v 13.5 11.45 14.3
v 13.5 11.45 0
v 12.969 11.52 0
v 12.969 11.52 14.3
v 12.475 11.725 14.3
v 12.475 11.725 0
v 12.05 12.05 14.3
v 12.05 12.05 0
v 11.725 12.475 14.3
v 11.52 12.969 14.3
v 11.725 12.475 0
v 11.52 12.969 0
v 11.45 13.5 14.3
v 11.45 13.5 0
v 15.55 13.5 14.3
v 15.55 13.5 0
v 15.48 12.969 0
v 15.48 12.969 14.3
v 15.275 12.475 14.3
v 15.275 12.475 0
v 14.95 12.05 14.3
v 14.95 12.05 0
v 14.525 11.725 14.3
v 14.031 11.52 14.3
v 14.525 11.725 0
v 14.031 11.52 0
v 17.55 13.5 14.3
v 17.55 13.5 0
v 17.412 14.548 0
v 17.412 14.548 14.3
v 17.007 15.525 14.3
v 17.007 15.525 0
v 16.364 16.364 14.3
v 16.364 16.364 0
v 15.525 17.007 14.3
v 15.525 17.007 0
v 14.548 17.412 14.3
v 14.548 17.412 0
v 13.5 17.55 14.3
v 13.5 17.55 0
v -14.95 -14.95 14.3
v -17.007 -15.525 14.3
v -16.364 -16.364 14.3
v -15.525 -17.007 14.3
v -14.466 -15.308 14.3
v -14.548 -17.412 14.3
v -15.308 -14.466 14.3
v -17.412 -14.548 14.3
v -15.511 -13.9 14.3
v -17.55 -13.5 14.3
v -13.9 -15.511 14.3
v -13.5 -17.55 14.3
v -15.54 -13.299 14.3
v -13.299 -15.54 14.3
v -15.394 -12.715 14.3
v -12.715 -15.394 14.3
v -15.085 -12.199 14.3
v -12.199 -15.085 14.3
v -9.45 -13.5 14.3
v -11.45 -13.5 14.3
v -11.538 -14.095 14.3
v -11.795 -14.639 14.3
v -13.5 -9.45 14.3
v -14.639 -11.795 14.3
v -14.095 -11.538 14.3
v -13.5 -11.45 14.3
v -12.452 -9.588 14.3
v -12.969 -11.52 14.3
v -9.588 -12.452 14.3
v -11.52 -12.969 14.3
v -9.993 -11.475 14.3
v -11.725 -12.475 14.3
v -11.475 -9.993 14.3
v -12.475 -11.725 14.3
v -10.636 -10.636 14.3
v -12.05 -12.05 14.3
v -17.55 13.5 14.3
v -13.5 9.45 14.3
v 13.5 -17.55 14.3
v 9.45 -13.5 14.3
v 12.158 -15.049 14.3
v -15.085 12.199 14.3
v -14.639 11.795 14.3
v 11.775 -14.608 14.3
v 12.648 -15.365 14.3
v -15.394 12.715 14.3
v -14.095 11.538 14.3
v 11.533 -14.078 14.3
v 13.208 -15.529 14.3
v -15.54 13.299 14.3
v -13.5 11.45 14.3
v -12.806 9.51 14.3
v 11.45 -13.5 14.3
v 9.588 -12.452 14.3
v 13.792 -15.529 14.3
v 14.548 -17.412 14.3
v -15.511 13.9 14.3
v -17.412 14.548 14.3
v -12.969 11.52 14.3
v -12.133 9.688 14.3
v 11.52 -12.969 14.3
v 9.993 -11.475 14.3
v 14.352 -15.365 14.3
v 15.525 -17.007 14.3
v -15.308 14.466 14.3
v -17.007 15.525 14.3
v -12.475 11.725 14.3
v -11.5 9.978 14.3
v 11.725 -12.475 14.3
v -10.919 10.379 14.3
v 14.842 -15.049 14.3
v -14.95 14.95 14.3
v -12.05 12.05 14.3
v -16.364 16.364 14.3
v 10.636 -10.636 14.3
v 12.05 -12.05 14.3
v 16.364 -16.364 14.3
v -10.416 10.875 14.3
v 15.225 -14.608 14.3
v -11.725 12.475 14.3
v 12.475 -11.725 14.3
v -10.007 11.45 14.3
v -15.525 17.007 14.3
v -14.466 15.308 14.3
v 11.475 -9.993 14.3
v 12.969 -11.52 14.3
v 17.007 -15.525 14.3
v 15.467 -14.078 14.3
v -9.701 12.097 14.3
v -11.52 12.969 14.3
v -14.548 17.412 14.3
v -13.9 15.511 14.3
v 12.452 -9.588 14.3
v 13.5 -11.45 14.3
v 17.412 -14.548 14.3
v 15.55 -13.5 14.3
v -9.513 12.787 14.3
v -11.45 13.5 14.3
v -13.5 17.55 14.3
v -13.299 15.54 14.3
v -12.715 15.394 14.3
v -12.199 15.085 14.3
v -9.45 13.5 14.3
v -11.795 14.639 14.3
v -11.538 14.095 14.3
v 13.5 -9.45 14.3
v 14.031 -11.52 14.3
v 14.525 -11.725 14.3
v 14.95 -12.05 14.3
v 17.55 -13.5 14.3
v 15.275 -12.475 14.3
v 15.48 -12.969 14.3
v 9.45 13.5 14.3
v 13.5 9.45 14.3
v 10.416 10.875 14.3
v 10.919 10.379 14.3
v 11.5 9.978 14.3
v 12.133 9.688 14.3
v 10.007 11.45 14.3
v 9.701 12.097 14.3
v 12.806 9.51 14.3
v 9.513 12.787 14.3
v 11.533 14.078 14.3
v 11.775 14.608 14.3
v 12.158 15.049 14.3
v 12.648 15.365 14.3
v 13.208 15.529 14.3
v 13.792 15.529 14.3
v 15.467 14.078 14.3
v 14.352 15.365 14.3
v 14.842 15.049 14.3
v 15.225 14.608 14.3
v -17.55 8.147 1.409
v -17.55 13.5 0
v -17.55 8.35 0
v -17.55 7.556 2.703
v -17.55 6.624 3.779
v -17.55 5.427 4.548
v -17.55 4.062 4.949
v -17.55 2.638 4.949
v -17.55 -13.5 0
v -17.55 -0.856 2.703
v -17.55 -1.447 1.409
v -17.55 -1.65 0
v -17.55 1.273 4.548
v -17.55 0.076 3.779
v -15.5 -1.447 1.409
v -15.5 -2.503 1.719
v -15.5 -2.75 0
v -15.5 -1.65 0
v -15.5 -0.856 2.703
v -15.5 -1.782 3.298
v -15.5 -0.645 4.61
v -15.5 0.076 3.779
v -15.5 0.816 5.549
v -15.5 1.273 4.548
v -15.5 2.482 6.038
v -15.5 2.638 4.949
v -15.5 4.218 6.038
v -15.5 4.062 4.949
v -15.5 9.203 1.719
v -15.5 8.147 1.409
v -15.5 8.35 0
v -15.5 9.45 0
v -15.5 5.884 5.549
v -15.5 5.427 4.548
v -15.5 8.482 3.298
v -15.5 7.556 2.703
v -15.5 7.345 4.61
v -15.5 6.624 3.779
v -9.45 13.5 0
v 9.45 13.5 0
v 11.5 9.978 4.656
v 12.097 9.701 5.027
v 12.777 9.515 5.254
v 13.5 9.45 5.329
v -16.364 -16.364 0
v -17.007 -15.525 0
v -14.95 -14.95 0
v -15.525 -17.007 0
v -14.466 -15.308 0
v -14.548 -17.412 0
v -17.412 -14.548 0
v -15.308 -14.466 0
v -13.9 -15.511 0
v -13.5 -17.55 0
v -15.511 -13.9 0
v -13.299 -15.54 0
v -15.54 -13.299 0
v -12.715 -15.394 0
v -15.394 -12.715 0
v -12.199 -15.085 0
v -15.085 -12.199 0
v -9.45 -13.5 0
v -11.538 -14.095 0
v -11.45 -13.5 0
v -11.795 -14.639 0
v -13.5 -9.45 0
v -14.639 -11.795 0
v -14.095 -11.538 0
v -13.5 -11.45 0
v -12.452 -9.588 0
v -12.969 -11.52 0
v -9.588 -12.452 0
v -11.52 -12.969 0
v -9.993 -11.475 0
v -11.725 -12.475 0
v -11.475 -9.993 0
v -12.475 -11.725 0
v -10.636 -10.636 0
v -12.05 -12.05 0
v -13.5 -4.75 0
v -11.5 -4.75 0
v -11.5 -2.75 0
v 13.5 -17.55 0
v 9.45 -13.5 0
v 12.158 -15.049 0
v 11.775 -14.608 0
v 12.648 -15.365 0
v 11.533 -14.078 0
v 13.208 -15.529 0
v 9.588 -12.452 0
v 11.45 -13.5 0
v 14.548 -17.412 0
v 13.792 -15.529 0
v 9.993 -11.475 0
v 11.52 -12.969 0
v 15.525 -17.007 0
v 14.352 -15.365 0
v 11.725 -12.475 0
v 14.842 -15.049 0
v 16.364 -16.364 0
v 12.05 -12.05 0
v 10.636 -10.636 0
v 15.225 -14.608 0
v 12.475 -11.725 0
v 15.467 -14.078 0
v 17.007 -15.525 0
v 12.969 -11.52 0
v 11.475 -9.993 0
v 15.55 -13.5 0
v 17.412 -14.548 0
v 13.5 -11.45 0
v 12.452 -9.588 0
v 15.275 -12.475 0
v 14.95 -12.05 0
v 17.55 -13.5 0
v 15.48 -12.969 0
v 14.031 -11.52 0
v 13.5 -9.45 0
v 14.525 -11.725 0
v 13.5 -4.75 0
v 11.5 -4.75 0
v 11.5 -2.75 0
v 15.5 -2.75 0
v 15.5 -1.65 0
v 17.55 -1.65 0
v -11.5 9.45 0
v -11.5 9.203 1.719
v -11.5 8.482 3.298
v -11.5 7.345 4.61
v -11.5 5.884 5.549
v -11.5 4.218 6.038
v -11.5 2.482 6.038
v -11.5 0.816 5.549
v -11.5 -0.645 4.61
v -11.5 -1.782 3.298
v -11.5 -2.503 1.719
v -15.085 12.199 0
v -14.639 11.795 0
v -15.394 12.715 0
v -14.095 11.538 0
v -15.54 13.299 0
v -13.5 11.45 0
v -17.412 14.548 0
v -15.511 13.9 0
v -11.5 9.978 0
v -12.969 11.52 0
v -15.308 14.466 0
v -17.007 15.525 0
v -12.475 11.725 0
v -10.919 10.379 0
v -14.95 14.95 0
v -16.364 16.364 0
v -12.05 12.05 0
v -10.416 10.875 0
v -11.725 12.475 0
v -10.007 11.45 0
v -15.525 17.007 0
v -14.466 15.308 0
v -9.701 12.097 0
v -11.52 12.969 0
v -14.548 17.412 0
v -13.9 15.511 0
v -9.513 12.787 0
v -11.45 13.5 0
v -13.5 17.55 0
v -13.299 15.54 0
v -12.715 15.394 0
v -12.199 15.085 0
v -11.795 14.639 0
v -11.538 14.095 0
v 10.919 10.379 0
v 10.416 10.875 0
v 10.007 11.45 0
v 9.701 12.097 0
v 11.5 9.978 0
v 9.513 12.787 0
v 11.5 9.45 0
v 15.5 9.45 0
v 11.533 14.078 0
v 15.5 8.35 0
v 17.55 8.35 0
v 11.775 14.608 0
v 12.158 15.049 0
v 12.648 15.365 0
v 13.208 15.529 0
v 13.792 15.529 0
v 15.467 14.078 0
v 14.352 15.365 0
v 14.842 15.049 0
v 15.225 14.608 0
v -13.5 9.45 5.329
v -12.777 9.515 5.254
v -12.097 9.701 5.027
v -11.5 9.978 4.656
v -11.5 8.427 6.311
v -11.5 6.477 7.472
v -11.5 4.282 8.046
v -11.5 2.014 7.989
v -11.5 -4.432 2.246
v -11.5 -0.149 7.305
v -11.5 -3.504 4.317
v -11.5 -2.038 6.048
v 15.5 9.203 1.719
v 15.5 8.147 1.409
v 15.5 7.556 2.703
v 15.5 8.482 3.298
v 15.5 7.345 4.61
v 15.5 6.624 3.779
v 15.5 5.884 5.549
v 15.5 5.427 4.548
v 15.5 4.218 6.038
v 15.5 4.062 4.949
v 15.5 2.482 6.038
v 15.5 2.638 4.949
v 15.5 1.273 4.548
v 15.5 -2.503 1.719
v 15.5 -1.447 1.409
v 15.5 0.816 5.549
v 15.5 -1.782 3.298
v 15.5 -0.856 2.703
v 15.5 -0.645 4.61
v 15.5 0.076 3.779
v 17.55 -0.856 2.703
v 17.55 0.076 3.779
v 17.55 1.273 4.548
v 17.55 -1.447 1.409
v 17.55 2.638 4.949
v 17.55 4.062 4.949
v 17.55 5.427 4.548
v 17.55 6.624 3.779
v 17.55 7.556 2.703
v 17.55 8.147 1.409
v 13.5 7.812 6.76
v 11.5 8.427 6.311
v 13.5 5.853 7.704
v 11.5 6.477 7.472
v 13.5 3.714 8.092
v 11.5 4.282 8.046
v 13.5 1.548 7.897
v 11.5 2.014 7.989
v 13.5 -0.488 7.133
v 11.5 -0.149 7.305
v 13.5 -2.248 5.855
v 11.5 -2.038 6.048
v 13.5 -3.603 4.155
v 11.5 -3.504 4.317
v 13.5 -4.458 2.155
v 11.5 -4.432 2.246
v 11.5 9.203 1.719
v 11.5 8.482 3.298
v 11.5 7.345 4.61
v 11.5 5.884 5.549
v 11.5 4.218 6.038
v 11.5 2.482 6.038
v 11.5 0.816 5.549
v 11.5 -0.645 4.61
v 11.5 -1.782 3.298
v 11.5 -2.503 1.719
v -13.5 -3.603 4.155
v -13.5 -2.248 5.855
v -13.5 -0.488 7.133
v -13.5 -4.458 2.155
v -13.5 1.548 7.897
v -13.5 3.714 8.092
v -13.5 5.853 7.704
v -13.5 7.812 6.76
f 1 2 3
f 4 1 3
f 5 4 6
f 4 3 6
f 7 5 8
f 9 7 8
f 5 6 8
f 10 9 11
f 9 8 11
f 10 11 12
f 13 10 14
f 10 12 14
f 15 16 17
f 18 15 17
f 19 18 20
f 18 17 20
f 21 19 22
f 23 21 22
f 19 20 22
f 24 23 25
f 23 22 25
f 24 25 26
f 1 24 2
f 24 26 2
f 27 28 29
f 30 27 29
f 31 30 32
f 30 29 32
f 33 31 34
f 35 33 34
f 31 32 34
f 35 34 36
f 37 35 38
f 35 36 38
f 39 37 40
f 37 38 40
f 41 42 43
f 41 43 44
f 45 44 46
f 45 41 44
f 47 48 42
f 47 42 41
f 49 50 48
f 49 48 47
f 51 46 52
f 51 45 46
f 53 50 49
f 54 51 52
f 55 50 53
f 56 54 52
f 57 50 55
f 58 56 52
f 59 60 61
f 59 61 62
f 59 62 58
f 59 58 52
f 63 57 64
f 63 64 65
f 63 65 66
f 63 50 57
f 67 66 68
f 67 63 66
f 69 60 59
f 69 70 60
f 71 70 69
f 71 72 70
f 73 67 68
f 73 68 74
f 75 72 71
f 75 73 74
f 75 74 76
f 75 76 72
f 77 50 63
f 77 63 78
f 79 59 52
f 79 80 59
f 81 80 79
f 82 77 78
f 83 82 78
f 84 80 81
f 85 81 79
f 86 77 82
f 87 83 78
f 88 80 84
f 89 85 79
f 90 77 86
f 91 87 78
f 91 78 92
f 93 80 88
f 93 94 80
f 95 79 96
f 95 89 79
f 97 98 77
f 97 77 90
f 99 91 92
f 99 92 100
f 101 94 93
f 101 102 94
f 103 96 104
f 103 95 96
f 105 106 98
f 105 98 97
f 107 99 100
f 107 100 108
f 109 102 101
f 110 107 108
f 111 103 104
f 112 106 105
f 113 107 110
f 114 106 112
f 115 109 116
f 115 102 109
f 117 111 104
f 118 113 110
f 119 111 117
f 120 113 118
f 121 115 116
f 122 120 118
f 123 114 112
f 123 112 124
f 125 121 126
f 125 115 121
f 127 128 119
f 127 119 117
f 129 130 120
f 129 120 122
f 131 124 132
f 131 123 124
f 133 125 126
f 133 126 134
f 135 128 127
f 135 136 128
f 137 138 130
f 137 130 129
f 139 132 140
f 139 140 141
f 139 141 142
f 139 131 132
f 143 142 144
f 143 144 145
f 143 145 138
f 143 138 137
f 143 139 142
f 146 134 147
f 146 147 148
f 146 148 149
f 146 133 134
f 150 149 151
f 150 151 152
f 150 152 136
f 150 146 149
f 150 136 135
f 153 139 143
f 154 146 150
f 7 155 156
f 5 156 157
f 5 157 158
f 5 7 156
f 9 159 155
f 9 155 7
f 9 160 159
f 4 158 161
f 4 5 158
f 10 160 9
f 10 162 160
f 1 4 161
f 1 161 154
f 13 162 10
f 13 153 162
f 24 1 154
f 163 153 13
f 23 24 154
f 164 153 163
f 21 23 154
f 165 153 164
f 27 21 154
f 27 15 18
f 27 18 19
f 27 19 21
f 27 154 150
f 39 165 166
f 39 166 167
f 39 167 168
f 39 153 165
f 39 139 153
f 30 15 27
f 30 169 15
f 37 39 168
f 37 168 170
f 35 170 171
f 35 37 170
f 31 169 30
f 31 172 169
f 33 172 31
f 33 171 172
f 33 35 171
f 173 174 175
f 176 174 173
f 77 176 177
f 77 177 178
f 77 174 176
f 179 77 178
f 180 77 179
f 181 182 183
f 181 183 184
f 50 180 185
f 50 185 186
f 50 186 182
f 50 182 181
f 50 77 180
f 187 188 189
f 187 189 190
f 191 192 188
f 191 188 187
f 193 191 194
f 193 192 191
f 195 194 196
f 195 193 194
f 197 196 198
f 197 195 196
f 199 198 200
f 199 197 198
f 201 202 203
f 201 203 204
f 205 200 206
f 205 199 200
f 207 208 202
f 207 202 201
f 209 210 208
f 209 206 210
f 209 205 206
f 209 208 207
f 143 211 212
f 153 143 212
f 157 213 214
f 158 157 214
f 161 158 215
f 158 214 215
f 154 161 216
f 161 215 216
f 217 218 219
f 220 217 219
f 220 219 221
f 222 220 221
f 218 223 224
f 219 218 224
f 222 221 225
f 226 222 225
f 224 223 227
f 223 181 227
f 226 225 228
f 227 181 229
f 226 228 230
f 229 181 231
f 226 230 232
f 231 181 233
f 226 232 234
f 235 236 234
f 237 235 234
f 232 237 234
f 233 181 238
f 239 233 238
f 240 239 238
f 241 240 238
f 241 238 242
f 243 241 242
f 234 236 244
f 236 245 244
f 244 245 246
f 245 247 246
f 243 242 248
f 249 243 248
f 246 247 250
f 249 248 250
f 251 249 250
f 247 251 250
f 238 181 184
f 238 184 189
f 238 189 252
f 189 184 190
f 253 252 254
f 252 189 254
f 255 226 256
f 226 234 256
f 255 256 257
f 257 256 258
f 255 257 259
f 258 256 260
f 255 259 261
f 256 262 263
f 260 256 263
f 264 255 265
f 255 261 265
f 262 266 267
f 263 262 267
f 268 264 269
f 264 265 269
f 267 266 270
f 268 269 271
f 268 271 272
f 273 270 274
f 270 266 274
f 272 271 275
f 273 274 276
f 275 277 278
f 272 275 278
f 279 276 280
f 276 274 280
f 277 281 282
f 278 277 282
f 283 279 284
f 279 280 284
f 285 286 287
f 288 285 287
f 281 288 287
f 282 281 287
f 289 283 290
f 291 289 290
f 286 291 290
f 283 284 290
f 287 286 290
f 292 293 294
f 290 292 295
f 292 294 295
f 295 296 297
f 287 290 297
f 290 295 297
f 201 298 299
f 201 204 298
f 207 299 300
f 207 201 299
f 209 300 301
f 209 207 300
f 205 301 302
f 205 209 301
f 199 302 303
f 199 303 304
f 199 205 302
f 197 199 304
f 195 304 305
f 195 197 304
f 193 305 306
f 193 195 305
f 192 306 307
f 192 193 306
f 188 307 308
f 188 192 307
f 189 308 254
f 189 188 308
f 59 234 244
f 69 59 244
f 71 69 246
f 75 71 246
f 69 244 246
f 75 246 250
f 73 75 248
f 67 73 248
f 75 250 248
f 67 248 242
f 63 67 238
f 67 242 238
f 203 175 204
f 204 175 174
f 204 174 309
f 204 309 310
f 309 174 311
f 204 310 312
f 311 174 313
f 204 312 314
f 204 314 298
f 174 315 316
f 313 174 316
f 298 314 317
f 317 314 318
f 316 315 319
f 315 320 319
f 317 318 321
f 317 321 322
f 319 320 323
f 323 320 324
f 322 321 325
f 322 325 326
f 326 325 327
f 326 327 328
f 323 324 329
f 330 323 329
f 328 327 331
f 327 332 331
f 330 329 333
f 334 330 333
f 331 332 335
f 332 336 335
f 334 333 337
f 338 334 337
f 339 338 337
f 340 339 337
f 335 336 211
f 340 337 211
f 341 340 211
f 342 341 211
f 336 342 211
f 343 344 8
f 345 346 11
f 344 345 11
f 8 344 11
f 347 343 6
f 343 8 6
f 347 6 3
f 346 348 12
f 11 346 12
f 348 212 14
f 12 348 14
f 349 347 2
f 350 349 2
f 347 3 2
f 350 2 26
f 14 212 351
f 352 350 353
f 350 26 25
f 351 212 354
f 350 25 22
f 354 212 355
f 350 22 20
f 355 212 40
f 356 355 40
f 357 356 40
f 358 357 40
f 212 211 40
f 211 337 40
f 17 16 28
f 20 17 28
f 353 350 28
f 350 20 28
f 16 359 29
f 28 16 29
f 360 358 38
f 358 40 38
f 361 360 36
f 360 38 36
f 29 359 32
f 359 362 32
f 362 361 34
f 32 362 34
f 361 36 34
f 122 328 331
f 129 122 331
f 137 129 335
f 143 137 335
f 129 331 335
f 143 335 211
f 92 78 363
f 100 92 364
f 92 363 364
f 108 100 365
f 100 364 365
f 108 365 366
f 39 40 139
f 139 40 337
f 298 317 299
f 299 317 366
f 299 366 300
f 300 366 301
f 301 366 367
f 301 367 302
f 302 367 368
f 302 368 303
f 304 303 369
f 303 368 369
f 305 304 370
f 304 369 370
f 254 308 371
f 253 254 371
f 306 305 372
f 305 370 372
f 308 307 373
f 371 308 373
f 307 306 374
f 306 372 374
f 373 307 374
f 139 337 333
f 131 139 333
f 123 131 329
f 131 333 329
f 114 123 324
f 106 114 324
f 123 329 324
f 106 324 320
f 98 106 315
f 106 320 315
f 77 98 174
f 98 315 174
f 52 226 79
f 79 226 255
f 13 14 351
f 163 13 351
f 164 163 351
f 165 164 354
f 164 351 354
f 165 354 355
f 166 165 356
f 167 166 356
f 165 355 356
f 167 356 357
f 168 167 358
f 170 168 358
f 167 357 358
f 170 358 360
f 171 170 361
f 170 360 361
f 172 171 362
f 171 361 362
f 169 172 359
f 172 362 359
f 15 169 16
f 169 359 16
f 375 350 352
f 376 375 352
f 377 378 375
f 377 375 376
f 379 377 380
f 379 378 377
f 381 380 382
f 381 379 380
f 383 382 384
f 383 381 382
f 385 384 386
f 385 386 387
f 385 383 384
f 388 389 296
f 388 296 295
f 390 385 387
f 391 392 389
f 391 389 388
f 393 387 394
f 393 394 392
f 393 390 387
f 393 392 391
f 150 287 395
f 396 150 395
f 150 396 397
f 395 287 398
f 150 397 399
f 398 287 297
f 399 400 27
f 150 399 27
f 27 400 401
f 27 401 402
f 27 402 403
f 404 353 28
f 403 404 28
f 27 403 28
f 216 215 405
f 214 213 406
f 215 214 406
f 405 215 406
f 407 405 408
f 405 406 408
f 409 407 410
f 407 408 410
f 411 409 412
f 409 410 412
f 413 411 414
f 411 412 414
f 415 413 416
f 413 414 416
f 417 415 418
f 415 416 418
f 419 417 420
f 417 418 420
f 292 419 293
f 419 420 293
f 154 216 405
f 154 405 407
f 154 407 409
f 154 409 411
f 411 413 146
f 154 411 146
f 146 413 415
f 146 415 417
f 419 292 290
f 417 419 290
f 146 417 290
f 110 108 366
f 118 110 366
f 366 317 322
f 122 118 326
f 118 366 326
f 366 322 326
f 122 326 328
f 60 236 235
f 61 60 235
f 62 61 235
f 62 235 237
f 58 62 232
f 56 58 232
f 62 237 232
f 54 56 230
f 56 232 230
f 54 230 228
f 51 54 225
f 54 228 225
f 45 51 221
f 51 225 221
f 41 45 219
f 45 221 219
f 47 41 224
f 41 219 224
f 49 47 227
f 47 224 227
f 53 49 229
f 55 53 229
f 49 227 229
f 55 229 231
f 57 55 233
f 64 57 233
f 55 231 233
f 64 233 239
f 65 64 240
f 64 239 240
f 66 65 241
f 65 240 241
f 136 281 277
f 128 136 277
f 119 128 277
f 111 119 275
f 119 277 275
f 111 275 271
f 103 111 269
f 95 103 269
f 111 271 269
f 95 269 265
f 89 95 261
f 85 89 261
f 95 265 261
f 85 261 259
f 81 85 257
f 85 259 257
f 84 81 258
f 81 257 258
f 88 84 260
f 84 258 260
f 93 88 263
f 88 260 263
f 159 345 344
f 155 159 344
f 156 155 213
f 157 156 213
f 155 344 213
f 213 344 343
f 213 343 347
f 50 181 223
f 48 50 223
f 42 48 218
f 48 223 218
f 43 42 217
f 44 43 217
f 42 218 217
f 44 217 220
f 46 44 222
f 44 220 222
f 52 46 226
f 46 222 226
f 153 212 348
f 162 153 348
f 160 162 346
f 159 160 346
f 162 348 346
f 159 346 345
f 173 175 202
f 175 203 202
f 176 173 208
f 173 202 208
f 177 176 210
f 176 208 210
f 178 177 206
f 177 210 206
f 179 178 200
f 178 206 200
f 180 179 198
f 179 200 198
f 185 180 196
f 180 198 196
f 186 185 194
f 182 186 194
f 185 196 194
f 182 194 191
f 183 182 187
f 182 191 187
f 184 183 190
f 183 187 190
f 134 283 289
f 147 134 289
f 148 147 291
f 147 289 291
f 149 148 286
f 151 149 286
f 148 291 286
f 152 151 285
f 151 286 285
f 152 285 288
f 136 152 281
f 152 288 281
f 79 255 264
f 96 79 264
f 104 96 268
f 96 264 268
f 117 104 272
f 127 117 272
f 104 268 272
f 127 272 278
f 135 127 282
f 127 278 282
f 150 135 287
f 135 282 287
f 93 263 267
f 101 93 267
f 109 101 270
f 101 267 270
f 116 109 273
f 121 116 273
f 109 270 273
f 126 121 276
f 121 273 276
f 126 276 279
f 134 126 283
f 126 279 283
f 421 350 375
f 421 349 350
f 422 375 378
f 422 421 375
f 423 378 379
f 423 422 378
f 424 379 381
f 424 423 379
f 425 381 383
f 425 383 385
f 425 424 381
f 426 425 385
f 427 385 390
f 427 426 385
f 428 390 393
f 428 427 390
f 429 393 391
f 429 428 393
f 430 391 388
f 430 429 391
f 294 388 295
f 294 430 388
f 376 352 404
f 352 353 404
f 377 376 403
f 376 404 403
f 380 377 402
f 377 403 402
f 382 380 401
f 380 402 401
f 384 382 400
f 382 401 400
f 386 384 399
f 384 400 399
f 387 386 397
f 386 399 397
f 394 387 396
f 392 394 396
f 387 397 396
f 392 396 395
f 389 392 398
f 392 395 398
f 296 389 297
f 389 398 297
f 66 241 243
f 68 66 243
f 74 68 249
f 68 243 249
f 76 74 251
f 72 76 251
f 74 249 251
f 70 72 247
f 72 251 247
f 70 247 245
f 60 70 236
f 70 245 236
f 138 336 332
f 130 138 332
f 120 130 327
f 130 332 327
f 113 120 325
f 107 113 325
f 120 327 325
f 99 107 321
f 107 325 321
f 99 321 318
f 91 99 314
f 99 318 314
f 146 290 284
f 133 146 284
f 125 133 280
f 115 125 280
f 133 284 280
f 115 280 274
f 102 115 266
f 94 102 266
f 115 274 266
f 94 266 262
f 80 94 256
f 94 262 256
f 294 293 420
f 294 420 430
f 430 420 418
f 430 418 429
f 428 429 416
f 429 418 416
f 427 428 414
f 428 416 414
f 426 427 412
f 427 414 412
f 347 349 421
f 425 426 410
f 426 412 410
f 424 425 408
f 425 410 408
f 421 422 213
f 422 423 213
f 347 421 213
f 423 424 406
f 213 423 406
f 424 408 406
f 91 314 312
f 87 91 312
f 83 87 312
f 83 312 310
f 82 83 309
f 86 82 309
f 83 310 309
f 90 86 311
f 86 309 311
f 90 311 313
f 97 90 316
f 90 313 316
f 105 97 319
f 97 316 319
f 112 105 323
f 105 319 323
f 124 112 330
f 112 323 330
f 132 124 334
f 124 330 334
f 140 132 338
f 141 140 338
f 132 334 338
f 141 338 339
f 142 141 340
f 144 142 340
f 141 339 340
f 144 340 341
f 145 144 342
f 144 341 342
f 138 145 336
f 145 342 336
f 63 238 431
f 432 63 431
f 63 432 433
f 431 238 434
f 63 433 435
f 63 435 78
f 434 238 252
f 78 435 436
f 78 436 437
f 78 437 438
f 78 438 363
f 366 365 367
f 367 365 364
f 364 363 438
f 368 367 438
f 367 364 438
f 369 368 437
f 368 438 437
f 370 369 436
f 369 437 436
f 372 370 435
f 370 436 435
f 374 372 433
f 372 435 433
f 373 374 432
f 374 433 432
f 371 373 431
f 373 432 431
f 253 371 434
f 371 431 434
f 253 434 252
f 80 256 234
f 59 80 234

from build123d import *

# Parameters (mm, degrees)
F0_W     = 2
F0_H     = 6.1
F0_H_2   = 2
F0_W_2   = 2.05
F0_H_3   = 5
F1_DEPTH = 14.3
F2_ANGLE = 180
F3_ANGLE = 180


with BuildPart() as f1:
    # F0 (on Top) → F1 (new body)
    with BuildSketch(Plane.XY):
        with BuildLine():
            ThreePointArc((-13.5, 9.45), (-14.5342970466, 9.5842970466), (-15.5, 9.9782816694))
            Line((-15.5, 9.9782816694), (-15.5, 9.45))
            Line((-15.5, 9.45), (-13.5, 9.45))
        make_face()
        with BuildLine():
            ThreePointArc((-9.45, 13.5), (-10.6362175362, 16.3637824638), (-13.5, 17.55))
            ThreePointArc((-13.5, 17.55), (-16.3637824638, 16.3637824638), (-17.55, 13.5))
            ThreePointArc((-17.55, 13.5), (-17.0001785669, 11.4625383439), (-15.5, 9.9782816694))
            Line((-15.5, 9.9782816694), (-15.5, 11.45))
            Line((-15.5, 11.45), (-13.5, 11.45))
            ThreePointArc((-13.5, 11.45), (-14.9495689014, 14.9495689014), (-11.45, 13.5))
            Line((-11.45, 13.5), (-9.45, 13.5))
        make_face()
        with BuildLine():
            Line((-15.5, 11.45), (-15.5, 9.9782816694))
            ThreePointArc((-15.5, 9.9782816694), (-14.5342970466, 9.5842970466), (-13.5, 9.45))
            Line((-13.5, 9.45), (-13.5, 11.45))
            Line((-13.5, 11.45), (-15.5, 11.45))
        make_face()
        with BuildLine():
            ThreePointArc((-15.5, 9.9782816694), (-17.0001785669, 11.4625383439), (-17.55, 13.5))
            Line((-17.55, 13.5), (-17.55, 8.35))
            Line((-17.55, 8.35), (-15.5, 8.35))
            Line((-15.5, 8.35), (-15.5, 9.45))
            Line((-15.5, 9.45), (-15.5, 9.9782816694))
        make_face()
        with Locations((-14.5, 0.3)):
            Rectangle(F0_W, F0_H)
        with Locations((-14.5, -3.75)):
            Rectangle(F0_W, F0_H_2)
        with BuildLine():
            ThreePointArc((-13.5, -9.45), (-16.3637824638, -10.6362175362), (-17.55, -13.5))
            ThreePointArc((-17.55, -13.5), (-16.3637824638, -16.3637824638), (-13.5, -17.55))
            ThreePointArc((-13.5, -17.55), (-10.6362175362, -16.3637824638), (-9.45, -13.5))
            Line((-9.45, -13.5), (-11.45, -13.5))
            ThreePointArc((-11.45, -13.5), (-14.9495689014, -14.9495689014), (-13.5, -11.45))
            Line((-13.5, -11.45), (-13.5, -9.45))
        make_face()
        with BuildLine():
            Line((-13.5, -17.55), (13.5, -17.55))
            ThreePointArc((13.5, -17.55), (10.6362175362, -16.3637824638), (9.45, -13.5))
            Line((9.45, -13.5), (-9.45, -13.5))
            ThreePointArc((-9.45, -13.5), (-10.6362175362, -16.3637824638), (-13.5, -17.55))
        make_face()
        with BuildLine():
            ThreePointArc((-9.45, -13.5), (-10.6362175362, -10.6362175362), (-13.5, -9.45))
            Line((-13.5, -9.45), (-13.5, -11.45))
            ThreePointArc((-13.5, -11.45), (-12.0504310986, -12.0504310986), (-11.45, -13.5))
            Line((-11.45, -13.5), (-9.45, -13.5))
        make_face()
        with BuildLine():
            ThreePointArc((13.5, -17.55), (16.3637824638, -16.3637824638), (17.55, -13.5))
            ThreePointArc((17.55, -13.5), (16.3637824638, -10.6362175362), (13.5, -9.45))
            Line((13.5, -9.45), (13.5, -11.45))
            ThreePointArc((13.5, -11.45), (14.9495689014, -12.0504310986), (15.55, -13.5))
            ThreePointArc((15.55, -13.5), (13.5, -15.55), (11.45, -13.5))
            Line((11.45, -13.5), (9.45, -13.5))
            ThreePointArc((9.45, -13.5), (10.6362175362, -16.3637824638), (13.5, -17.55))
        make_face()
        with BuildLine():
            Line((13.5, -11.45), (13.5, -9.45))
            ThreePointArc((13.5, -9.45), (10.6362175362, -10.6362175362), (9.45, -13.5))
            Line((9.45, -13.5), (11.45, -13.5))
            ThreePointArc((11.45, -13.5), (12.0504310986, -12.0504310986), (13.5, -11.45))
        make_face()
        with BuildLine():
            Line((17.55, 8.35), (17.55, 13.5))
            ThreePointArc((17.55, 13.5), (17.0001785669, 11.4625383439), (15.5, 9.9782816694))
            Line((15.5, 9.9782816694), (15.5, 9.45))
            Line((15.5, 9.45), (15.5, 8.35))
            Line((15.5, 8.35), (17.55, 8.35))
        make_face()
        with Locations((14.5, -3.75)):
            Rectangle(F0_W, F0_H_2)
        with Locations((14.5, 0.3)):
            Rectangle(F0_W, F0_H)
        with BuildLine():
            Line((15.5, 9.45), (15.5, 9.9782816694))
            ThreePointArc((15.5, 9.9782816694), (14.5342970466, 9.5842970466), (13.5, 9.45))
            Line((13.5, 9.45), (15.5, 9.45))
        make_face()
        with BuildLine():
            ThreePointArc((13.5, 9.45), (14.5342970466, 9.5842970466), (15.5, 9.9782816694))
            Line((15.5, 9.9782816694), (15.5, 11.45))
            Line((15.5, 11.45), (13.5, 11.45))
            Line((13.5, 11.45), (13.5, 9.45))
        make_face()
        with BuildLine():
            ThreePointArc((11.5, 9.9782816694), (12.4657029534, 9.5842970466), (13.5, 9.45))
            Line((13.5, 9.45), (13.5, 11.45))
            Line((13.5, 11.45), (11.5, 11.45))
            Line((11.5, 11.45), (11.5, 9.9782816694))
        make_face()
        with BuildLine():
            Line((11.5, 11.45), (10.0071501607, 11.45))
            ThreePointArc((10.0071501607, 11.45), (10.6567028733, 10.6158776986), (11.5, 9.9782816694))
            Line((11.5, 9.9782816694), (11.5, 11.45))
        make_face()
        with BuildLine():
            Line((11.45, 13.5), (9.45, 13.5))
            ThreePointArc((9.45, 13.5), (9.5917688241, 12.4378187182), (10.0071501607, 11.45))
            Line((10.0071501607, 11.45), (11.5, 11.45))
            Line((11.5, 11.45), (13.5, 11.45))
            ThreePointArc((13.5, 11.45), (12.0504310986, 12.0504310986), (11.45, 13.5))
        make_face()
        with BuildLine():
            ThreePointArc((17.55, 13.5), (16.3637824638, 16.3637824638), (13.5, 17.55))
            ThreePointArc((13.5, 17.55), (10.6362175362, 16.3637824638), (9.45, 13.5))
            Line((9.45, 13.5), (11.45, 13.5))
            ThreePointArc((11.45, 13.5), (13.5, 15.55), (15.55, 13.5))
            ThreePointArc((15.55, 13.5), (14.9495689014, 12.0504310986), (13.5, 11.45))
            Line((13.5, 11.45), (15.5, 11.45))
            Line((15.5, 11.45), (15.5, 9.9782816694))
            ThreePointArc((15.5, 9.9782816694), (17.0001785669, 11.4625383439), (17.55, 13.5))
        make_face()
        with BuildLine():
            ThreePointArc((9.45, 13.5), (10.6362175362, 16.3637824638), (13.5, 17.55))
            Line((13.5, 17.55), (-13.5, 17.55))
            ThreePointArc((-13.5, 17.55), (-10.6362175362, 16.3637824638), (-9.45, 13.5))
            Line((-9.45, 13.5), (9.45, 13.5))
        make_face()
        with BuildLine():
            ThreePointArc((-10.0071501607, 11.45), (-9.5917688241, 12.4378187182), (-9.45, 13.5))
            Line((-9.45, 13.5), (-11.45, 13.5))
            ThreePointArc((-11.45, 13.5), (-12.0504310986, 12.0504310986), (-13.5, 11.45))
            Line((-13.5, 11.45), (-11.5, 11.45))
            Line((-11.5, 11.45), (-10.0071501607, 11.45))
        make_face()
        with BuildLine():
            Line((-11.5, 11.45), (-13.5, 11.45))
            Line((-13.5, 11.45), (-13.5, 9.45))
            ThreePointArc((-13.5, 9.45), (-12.4657029534, 9.5842970466), (-11.5, 9.9782816694))
            Line((-11.5, 9.9782816694), (-11.5, 11.45))
        make_face()
        with BuildLine():
            ThreePointArc((-11.5, 9.9782816694), (-10.6567028733, 10.6158776986), (-10.0071501607, 11.45))
            Line((-10.0071501607, 11.45), (-11.5, 11.45))
            Line((-11.5, 11.45), (-11.5, 9.9782816694))
        make_face()
        with BuildLine():
            Line((-15.5, 3.35), (-17.55, 3.35))
            Line((-17.55, 3.35), (-17.55, -13.5))
            ThreePointArc((-17.55, -13.5), (-16.3637824638, -10.6362175362), (-13.5, -9.45))
            Line((-13.5, -9.45), (-13.5, -4.75))
            Line((-13.5, -4.75), (-15.5, -4.75))
            Line((-15.5, -4.75), (-15.5, -2.75))
            Line((-15.5, -2.75), (-15.5, 3.35))
        make_face()
        with Locations((-16.525, 5.85)):
            Rectangle(F0_W_2, F0_H_3)
        Polygon((-15.5, 9.45), (-15.5, 8.35), (-15.5, 3.35), (-13.5, 3.35), (-13.5, 9.45), align=None)
        with Locations((16.525, 5.85)):
            Rectangle(F0_W_2, F0_H_3)
        Polygon((15.5, 3.35), (15.5, 8.35), (15.5, 9.45), (13.5, 9.45), (13.5, 3.35), align=None)
        with BuildLine():
            Line((17.55, -13.5), (17.55, 3.35))
            Line((17.55, 3.35), (15.5, 3.35))
            Line((15.5, 3.35), (15.5, -2.75))
            Line((15.5, -2.75), (15.5, -4.75))
            Line((15.5, -4.75), (13.5, -4.75))
            Line((13.5, -4.75), (13.5, -9.45))
            ThreePointArc((13.5, -9.45), (16.3637824638, -10.6362175362), (17.55, -13.5))
        make_face()
    extrude(amount=F1_DEPTH)

    # F0 (on Top) → F2 (revolve)
    with BuildSketch(Plane.XY):
        with Locations((-16.525, 5.85)):
            Rectangle(F0_W_2, F0_H_3)
        Polygon((-15.5, 9.45), (-15.5, 8.35), (-15.5, 3.35), (-13.5, 3.35), (-13.5, 9.45), align=None)
        with Locations((-12.5, 6.4)):
            Rectangle(F0_W, F0_H)
        with BuildLine():
            Line((-11.5, 11.45), (-13.5, 11.45))
            Line((-13.5, 11.45), (-13.5, 9.45))
            ThreePointArc((-13.5, 9.45), (-12.4657029534, 9.5842970466), (-11.5, 9.9782816694))
            Line((-11.5, 9.9782816694), (-11.5, 11.45))
        make_face()
        with BuildLine():
            Line((-15.5, 11.45), (-15.5, 9.9782816694))
            ThreePointArc((-15.5, 9.9782816694), (-14.5342970466, 9.5842970466), (-13.5, 9.45))
            Line((-13.5, 9.45), (-13.5, 11.45))
            Line((-13.5, 11.45), (-15.5, 11.45))
        make_face()
        with BuildLine():
            ThreePointArc((11.5, 9.9782816694), (12.4657029534, 9.5842970466), (13.5, 9.45))
            Line((13.5, 9.45), (13.5, 11.45))
            Line((13.5, 11.45), (11.5, 11.45))
            Line((11.5, 11.45), (11.5, 9.9782816694))
        make_face()
        with Locations((12.5, 6.4)):
            Rectangle(F0_W, F0_H)
        Polygon((15.5, 3.35), (15.5, 8.35), (15.5, 9.45), (13.5, 9.45), (13.5, 3.35), align=None)
        with BuildLine():
            ThreePointArc((13.5, 9.45), (14.5342970466, 9.5842970466), (15.5, 9.9782816694))
            Line((15.5, 9.9782816694), (15.5, 11.45))
            Line((15.5, 11.45), (13.5, 11.45))
            Line((13.5, 11.45), (13.5, 9.45))
        make_face()
        with Locations((16.525, 5.85)):
            Rectangle(F0_W_2, F0_H_3)
        with BuildLine():
            Line((-11.5, 9.45), (-11.5, 9.9782816694))
            ThreePointArc((-11.5, 9.9782816694), (-12.4657029534, 9.5842970466), (-13.5, 9.45))
            Line((-13.5, 9.45), (-11.5, 9.45))
        make_face()
        with BuildLine():
            ThreePointArc((-13.5, 9.45), (-14.5342970466, 9.5842970466), (-15.5, 9.9782816694))
            Line((-15.5, 9.9782816694), (-15.5, 9.45))
            Line((-15.5, 9.45), (-13.5, 9.45))
        make_face()
        with BuildLine():
            Line((15.5, 9.45), (15.5, 9.9782816694))
            ThreePointArc((15.5, 9.9782816694), (14.5342970466, 9.5842970466), (13.5, 9.45))
            Line((13.5, 9.45), (15.5, 9.45))
        make_face()
        with BuildLine():
            Line((11.5, 9.45), (13.5, 9.45))
            ThreePointArc((13.5, 9.45), (12.4657029534, 9.5842970466), (11.5, 9.9782816694))
            Line((11.5, 9.9782816694), (11.5, 9.45))
        make_face()
    revolve(axis=Axis((0, 3.35, 0), (1, 0, 0)), revolution_arc=F2_ANGLE)

    # F0 (on Top) → F3 (revolve, cut)
    with BuildSketch(Plane.XY):
        Polygon((15.5, 3.35), (15.5, 8.35), (15.5, 9.45), (13.5, 9.45), (13.5, 3.35), align=None)
        with Locations((16.525, 5.85)):
            Rectangle(F0_W_2, F0_H_3)
        with Locations((12.5, 6.4)):
            Rectangle(F0_W, F0_H)
        with Locations((-12.5, 6.4)):
            Rectangle(F0_W, F0_H)
        Polygon((-15.5, 9.45), (-15.5, 8.35), (-15.5, 3.35), (-13.5, 3.35), (-13.5, 9.45), align=None)
        with Locations((-16.525, 5.85)):
            Rectangle(F0_W_2, F0_H_3)
    revolve(axis=Axis((0, 3.35, 0), (1, 0, 0)), revolution_arc=F3_ANGLE, mode=Mode.SUBTRACT)


solid = f1.part
